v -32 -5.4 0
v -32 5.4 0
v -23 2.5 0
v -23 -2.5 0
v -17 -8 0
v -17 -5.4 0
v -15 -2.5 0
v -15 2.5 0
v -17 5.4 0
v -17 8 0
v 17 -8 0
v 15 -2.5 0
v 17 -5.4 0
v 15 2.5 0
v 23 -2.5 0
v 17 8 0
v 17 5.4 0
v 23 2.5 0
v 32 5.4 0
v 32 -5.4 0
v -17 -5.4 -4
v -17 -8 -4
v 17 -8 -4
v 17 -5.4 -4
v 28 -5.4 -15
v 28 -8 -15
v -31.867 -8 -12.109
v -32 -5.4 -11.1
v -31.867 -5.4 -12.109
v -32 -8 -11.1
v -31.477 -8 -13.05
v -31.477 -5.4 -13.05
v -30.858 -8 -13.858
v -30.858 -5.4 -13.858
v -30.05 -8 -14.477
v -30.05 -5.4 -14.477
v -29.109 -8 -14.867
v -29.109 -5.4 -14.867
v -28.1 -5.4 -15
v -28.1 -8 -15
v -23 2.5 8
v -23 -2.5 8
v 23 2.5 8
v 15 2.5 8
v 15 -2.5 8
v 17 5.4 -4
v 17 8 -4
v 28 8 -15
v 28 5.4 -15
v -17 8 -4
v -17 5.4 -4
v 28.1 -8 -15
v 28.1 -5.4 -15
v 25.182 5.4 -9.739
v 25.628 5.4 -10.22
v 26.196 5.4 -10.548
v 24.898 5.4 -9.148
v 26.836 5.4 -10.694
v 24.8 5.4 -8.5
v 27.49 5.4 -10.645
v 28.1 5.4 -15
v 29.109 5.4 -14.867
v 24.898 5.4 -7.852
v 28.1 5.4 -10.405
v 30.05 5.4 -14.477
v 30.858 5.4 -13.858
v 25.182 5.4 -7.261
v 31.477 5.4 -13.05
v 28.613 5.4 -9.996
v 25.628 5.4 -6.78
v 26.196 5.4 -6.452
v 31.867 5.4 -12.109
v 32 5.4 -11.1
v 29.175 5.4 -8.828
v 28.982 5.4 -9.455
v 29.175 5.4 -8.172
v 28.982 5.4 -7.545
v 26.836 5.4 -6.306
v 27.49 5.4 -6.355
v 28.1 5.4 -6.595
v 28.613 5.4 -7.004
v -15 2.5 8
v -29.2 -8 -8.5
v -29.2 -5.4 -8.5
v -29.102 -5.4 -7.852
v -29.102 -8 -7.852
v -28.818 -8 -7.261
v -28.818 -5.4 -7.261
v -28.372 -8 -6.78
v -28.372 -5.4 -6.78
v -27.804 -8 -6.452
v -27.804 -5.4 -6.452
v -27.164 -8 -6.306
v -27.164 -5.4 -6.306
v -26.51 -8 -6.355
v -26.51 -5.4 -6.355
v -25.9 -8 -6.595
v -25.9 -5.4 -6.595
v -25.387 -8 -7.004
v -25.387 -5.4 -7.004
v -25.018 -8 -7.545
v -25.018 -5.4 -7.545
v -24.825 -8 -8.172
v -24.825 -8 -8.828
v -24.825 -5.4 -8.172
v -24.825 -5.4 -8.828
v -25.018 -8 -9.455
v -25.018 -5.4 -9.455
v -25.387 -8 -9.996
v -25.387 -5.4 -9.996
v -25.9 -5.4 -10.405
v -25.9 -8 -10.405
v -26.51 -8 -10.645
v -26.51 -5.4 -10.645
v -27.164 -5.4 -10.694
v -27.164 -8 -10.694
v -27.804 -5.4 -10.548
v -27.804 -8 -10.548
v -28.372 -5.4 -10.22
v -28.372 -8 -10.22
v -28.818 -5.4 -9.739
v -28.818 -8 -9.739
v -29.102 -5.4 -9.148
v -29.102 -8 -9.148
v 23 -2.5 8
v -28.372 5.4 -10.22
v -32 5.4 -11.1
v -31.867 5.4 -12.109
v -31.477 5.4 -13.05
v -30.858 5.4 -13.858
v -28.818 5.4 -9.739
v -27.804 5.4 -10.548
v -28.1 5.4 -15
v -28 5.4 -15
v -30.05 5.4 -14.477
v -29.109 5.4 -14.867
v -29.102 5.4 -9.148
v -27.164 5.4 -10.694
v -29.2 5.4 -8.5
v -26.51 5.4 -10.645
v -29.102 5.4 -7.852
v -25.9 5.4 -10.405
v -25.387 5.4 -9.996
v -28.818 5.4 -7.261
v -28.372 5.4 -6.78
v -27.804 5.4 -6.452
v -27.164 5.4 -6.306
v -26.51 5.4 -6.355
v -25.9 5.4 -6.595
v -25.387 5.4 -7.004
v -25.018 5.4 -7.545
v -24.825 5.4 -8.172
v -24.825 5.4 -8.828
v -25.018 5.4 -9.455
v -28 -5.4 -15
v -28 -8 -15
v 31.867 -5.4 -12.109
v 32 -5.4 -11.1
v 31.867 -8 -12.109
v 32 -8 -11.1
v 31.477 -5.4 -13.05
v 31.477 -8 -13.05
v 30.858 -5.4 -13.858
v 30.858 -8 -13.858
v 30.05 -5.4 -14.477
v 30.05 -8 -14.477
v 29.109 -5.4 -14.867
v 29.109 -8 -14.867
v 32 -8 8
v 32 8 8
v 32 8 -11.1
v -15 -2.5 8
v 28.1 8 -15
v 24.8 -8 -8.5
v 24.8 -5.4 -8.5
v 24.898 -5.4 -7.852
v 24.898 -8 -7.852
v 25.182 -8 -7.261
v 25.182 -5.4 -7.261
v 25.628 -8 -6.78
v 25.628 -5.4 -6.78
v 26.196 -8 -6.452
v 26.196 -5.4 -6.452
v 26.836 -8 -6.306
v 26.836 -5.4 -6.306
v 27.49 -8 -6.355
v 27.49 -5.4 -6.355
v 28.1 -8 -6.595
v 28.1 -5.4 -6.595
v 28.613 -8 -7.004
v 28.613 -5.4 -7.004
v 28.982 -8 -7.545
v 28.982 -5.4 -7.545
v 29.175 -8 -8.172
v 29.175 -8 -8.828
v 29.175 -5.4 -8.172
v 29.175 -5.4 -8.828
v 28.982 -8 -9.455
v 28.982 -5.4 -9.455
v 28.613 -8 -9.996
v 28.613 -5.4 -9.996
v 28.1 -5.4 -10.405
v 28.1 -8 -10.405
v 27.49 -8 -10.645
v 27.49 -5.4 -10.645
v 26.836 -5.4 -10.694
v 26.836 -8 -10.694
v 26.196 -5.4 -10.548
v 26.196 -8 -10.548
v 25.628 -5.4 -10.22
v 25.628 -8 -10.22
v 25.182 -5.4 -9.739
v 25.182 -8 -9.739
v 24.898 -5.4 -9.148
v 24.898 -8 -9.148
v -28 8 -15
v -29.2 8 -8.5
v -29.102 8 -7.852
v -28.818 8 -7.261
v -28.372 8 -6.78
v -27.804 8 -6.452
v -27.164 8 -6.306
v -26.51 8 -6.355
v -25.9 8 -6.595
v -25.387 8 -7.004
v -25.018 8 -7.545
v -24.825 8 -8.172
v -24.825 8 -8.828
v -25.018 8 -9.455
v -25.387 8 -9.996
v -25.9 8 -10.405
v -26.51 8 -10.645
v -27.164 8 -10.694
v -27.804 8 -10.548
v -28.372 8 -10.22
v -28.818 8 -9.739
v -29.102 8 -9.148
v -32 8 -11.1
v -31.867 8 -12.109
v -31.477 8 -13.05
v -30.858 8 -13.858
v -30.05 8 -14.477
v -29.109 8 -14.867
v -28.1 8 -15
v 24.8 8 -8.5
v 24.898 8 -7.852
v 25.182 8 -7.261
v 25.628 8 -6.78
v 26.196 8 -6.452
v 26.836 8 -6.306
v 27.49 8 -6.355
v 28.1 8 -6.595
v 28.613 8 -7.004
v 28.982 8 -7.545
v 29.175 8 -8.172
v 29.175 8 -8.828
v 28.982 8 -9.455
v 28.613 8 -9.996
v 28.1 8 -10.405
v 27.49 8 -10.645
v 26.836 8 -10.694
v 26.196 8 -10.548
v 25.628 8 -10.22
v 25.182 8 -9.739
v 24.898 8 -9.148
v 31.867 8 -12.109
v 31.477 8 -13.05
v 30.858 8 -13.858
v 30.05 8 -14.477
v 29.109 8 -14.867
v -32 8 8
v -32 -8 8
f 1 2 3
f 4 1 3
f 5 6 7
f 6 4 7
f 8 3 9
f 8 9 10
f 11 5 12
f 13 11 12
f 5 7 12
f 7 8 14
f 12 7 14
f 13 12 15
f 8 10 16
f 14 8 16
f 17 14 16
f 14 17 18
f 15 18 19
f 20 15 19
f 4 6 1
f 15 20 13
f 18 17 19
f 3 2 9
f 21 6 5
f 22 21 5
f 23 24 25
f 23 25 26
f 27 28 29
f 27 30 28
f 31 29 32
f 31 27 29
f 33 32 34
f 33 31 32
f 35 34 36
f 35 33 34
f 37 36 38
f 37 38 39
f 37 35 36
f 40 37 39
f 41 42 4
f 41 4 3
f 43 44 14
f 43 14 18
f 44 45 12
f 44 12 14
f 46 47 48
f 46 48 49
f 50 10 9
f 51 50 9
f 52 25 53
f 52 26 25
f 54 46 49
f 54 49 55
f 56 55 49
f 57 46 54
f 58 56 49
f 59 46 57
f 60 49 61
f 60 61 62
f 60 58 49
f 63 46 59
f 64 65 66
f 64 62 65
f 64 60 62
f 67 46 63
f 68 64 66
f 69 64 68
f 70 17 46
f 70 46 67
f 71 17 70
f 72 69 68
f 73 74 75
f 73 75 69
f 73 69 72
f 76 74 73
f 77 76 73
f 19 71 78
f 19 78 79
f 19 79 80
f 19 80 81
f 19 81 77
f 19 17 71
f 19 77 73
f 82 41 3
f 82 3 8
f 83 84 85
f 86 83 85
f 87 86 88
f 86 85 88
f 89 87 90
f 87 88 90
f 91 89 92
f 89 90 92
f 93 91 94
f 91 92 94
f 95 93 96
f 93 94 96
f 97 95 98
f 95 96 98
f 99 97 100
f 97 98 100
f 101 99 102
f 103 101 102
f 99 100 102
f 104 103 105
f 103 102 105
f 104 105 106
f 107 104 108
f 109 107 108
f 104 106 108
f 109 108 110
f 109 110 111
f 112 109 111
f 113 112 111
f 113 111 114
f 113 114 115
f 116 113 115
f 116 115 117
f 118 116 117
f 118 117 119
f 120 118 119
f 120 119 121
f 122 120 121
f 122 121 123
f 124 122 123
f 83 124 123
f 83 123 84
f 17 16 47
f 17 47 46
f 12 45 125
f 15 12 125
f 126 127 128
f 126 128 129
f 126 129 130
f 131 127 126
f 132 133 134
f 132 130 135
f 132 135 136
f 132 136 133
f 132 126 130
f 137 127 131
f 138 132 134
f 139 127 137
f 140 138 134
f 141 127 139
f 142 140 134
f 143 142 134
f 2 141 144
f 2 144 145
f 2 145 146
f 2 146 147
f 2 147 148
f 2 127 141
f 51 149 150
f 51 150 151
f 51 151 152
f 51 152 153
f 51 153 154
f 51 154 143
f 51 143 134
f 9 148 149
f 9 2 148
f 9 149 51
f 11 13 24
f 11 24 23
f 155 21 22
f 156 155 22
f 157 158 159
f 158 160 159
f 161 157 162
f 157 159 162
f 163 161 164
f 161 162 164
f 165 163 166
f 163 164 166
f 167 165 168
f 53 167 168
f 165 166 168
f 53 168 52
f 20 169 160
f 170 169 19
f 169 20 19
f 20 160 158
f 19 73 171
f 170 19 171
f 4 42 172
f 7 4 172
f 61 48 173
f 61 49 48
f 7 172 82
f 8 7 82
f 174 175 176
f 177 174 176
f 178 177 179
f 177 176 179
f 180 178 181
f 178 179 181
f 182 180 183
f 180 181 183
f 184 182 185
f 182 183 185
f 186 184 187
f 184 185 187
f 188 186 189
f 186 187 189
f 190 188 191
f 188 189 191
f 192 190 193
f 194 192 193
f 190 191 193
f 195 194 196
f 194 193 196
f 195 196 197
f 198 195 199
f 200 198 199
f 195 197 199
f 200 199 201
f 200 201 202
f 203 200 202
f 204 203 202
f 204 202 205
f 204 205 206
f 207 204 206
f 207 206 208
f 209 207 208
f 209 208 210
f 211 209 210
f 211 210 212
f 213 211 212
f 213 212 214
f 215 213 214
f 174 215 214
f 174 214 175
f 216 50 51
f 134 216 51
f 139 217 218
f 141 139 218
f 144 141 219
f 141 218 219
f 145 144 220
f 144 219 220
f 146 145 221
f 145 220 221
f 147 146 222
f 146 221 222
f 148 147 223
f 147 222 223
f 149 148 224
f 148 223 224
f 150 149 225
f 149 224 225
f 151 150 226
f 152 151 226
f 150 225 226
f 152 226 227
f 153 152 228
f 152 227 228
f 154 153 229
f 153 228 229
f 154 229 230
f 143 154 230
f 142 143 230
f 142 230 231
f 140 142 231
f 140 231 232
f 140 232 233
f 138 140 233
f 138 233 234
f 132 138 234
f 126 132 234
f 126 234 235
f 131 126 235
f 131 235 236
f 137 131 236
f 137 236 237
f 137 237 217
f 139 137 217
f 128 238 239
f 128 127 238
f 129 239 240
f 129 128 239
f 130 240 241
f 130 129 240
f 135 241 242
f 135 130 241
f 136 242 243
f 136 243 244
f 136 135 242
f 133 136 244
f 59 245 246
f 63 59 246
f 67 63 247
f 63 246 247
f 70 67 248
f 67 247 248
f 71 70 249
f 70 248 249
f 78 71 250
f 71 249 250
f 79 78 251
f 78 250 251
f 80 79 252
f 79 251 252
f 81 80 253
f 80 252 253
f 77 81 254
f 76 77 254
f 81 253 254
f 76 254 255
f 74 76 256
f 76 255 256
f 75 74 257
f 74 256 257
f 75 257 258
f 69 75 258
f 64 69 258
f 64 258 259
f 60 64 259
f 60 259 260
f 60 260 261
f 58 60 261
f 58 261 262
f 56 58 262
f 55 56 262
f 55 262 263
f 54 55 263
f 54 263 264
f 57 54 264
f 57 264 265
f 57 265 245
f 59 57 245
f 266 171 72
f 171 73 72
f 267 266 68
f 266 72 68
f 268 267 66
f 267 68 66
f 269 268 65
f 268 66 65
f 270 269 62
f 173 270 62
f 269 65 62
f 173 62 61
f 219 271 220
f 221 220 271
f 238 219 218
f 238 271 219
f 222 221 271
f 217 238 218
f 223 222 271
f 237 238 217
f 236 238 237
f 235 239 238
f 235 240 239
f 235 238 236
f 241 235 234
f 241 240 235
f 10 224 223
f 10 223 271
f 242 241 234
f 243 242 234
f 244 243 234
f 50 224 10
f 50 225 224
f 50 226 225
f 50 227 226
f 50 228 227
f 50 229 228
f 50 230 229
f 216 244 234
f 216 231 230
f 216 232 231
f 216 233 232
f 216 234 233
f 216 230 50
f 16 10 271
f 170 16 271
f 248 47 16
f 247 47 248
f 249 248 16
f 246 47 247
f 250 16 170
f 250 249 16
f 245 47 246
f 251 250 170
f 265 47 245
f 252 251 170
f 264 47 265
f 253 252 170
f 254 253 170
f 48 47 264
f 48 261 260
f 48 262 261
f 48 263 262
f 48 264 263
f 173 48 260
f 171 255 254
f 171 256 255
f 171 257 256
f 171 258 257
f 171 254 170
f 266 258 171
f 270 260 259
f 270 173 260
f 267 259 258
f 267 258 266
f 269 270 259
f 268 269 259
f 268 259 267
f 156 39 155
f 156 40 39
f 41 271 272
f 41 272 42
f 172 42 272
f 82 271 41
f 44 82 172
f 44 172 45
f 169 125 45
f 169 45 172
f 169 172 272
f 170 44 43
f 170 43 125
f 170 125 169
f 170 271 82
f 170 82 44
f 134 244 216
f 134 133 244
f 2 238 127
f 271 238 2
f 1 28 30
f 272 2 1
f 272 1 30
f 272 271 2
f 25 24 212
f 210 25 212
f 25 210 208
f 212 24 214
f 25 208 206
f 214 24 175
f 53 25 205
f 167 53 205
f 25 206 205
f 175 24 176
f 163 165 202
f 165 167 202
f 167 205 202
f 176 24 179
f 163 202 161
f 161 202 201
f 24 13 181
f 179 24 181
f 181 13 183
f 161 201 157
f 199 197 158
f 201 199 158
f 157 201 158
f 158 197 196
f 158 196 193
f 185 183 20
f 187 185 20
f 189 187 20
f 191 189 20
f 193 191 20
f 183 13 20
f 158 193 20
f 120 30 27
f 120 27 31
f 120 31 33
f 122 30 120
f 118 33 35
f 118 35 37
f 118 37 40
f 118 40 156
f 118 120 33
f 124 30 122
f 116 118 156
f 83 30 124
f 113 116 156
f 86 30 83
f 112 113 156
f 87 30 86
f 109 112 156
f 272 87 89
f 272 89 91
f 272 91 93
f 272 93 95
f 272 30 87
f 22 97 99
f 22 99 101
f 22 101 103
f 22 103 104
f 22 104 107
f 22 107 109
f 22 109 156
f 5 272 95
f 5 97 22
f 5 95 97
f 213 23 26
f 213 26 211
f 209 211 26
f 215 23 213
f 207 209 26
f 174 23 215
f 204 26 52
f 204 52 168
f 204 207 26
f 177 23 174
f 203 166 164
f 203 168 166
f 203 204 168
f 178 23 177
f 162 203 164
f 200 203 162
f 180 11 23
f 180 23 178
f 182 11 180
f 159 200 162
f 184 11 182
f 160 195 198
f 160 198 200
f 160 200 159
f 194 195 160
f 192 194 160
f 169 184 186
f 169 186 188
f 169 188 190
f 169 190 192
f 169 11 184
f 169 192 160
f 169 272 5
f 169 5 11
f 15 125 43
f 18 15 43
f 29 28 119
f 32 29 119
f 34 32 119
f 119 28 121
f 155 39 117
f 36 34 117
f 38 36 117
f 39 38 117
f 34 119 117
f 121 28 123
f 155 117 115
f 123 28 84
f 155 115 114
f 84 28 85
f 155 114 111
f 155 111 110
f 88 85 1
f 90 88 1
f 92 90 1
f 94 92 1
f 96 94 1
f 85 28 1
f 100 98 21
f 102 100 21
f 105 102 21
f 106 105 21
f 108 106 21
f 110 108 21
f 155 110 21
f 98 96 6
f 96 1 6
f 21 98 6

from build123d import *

# Parameters (mm, degrees)
SKETCH_W        = 64
SKETCH_H        = 16
PAD_DEPTH       = 8
SKETCH001_W     = 15
SKETCH001_H     = 2.6
PAD001_DEPTH    = 15
SKETCH002_R     = 2.2
POCKET_DEPTH    = 16
CHAMFER_SIZE    = 11
CHAMFER001_SIZE = 11
CHAMFER002_SIZE = 11
CHAMFER003_SIZE = 11
FILLET_R        = 3.9
FILLET001_R     = 3.9
FILLET002_R     = 3.9
FILLET003_R     = 3.9
SKETCH004_W     = 8
SKETCH004_H     = 5
POCKET001_DEPTH = 8


with BuildPart() as part:
    # Sketch → Pad (new body)
    with BuildSketch(Plane.XY):
        Rectangle(SKETCH_W, SKETCH_H)
    extrude(amount=PAD_DEPTH)

    # Sketch001 (on Face5 of Pad) → Pad001 (join)
    with BuildSketch(Plane(origin=(0, 0, 0), x_dir=(1, 0, 0), z_dir=(0, 0, -1))):
        with Locations((-24.5, 6.7)):
            Rectangle(SKETCH001_W, SKETCH001_H)
        with Locations((-24.5, -6.7)):
            Rectangle(SKETCH001_W, SKETCH001_H)
        with Locations((24.5, 6.7)):
            Rectangle(SKETCH001_W, SKETCH001_H)
        with Locations((24.5, -6.7)):
            Rectangle(SKETCH001_W, SKETCH001_H)
    extrude(amount=PAD001_DEPTH)

    # Sketch002 (on Face4 of Pad001) → Pocket (cut)
    with BuildSketch(Plane(origin=(0, 8, 0), x_dir=(-1, 0, 0), z_dir=(0, 1, 0))):
        with Locations((-27, -8.5)):
            Circle(SKETCH002_R)
        with Locations((27, -8.5)):
            Circle(SKETCH002_R)
    extrude(amount=-POCKET_DEPTH, mode=Mode.SUBTRACT)

    # Chamfer
    chamfer_edges = [part.edges().sort_by_distance(p)[0] for p in [
        (17, 6.7, -15),
    ]]
    chamfer(chamfer_edges, length=CHAMFER_SIZE)

    # Chamfer001
    chamfer001_edges = [part.edges().sort_by_distance(p)[0] for p in [
        (17, -6.7, -15),
    ]]
    chamfer(chamfer001_edges, length=CHAMFER001_SIZE)

    # Chamfer002
    chamfer002_edges = [part.edges().sort_by_distance(p)[0] for p in [
        (-17, 6.7, -15),
    ]]
    chamfer(chamfer002_edges, length=CHAMFER002_SIZE)

    # Chamfer003
    chamfer003_edges = [part.edges().sort_by_distance(p)[0] for p in [
        (-17, -6.7, -15),
    ]]
    chamfer(chamfer003_edges, length=CHAMFER003_SIZE)

    # Fillet
    fillet_edges = [part.edges().sort_by_distance(p)[0] for p in [
        (-32, 6.7, -15),
    ]]
    fillet(fillet_edges, radius=FILLET_R)

    # Fillet001
    fillet001_edges = [part.edges().sort_by_distance(p)[0] for p in [
        (-32, -6.7, -15),
    ]]
    fillet(fillet001_edges, radius=FILLET001_R)

    # Fillet002
    fillet002_edges = [part.edges().sort_by_distance(p)[0] for p in [
        (32, -6.7, -15),
    ]]
    fillet(fillet002_edges, radius=FILLET002_R)

    # Fillet003
    fillet003_edges = [part.edges().sort_by_distance(p)[0] for p in [
        (32, 6.7, -15),
    ]]
    fillet(fillet003_edges, radius=FILLET003_R)

    # Sketch004 (on Face21 of Fillet003) → Pocket001 (cut)
    with BuildSketch(Plane.XY.offset(8)):
        with Locations((-19, 0)):
            Rectangle(SKETCH004_W, SKETCH004_H)
        with Locations((19, 0)):
            Rectangle(SKETCH004_W, SKETCH004_H)
    extrude(amount=-POCKET001_DEPTH, mode=Mode.SUBTRACT)


solid = part.part
